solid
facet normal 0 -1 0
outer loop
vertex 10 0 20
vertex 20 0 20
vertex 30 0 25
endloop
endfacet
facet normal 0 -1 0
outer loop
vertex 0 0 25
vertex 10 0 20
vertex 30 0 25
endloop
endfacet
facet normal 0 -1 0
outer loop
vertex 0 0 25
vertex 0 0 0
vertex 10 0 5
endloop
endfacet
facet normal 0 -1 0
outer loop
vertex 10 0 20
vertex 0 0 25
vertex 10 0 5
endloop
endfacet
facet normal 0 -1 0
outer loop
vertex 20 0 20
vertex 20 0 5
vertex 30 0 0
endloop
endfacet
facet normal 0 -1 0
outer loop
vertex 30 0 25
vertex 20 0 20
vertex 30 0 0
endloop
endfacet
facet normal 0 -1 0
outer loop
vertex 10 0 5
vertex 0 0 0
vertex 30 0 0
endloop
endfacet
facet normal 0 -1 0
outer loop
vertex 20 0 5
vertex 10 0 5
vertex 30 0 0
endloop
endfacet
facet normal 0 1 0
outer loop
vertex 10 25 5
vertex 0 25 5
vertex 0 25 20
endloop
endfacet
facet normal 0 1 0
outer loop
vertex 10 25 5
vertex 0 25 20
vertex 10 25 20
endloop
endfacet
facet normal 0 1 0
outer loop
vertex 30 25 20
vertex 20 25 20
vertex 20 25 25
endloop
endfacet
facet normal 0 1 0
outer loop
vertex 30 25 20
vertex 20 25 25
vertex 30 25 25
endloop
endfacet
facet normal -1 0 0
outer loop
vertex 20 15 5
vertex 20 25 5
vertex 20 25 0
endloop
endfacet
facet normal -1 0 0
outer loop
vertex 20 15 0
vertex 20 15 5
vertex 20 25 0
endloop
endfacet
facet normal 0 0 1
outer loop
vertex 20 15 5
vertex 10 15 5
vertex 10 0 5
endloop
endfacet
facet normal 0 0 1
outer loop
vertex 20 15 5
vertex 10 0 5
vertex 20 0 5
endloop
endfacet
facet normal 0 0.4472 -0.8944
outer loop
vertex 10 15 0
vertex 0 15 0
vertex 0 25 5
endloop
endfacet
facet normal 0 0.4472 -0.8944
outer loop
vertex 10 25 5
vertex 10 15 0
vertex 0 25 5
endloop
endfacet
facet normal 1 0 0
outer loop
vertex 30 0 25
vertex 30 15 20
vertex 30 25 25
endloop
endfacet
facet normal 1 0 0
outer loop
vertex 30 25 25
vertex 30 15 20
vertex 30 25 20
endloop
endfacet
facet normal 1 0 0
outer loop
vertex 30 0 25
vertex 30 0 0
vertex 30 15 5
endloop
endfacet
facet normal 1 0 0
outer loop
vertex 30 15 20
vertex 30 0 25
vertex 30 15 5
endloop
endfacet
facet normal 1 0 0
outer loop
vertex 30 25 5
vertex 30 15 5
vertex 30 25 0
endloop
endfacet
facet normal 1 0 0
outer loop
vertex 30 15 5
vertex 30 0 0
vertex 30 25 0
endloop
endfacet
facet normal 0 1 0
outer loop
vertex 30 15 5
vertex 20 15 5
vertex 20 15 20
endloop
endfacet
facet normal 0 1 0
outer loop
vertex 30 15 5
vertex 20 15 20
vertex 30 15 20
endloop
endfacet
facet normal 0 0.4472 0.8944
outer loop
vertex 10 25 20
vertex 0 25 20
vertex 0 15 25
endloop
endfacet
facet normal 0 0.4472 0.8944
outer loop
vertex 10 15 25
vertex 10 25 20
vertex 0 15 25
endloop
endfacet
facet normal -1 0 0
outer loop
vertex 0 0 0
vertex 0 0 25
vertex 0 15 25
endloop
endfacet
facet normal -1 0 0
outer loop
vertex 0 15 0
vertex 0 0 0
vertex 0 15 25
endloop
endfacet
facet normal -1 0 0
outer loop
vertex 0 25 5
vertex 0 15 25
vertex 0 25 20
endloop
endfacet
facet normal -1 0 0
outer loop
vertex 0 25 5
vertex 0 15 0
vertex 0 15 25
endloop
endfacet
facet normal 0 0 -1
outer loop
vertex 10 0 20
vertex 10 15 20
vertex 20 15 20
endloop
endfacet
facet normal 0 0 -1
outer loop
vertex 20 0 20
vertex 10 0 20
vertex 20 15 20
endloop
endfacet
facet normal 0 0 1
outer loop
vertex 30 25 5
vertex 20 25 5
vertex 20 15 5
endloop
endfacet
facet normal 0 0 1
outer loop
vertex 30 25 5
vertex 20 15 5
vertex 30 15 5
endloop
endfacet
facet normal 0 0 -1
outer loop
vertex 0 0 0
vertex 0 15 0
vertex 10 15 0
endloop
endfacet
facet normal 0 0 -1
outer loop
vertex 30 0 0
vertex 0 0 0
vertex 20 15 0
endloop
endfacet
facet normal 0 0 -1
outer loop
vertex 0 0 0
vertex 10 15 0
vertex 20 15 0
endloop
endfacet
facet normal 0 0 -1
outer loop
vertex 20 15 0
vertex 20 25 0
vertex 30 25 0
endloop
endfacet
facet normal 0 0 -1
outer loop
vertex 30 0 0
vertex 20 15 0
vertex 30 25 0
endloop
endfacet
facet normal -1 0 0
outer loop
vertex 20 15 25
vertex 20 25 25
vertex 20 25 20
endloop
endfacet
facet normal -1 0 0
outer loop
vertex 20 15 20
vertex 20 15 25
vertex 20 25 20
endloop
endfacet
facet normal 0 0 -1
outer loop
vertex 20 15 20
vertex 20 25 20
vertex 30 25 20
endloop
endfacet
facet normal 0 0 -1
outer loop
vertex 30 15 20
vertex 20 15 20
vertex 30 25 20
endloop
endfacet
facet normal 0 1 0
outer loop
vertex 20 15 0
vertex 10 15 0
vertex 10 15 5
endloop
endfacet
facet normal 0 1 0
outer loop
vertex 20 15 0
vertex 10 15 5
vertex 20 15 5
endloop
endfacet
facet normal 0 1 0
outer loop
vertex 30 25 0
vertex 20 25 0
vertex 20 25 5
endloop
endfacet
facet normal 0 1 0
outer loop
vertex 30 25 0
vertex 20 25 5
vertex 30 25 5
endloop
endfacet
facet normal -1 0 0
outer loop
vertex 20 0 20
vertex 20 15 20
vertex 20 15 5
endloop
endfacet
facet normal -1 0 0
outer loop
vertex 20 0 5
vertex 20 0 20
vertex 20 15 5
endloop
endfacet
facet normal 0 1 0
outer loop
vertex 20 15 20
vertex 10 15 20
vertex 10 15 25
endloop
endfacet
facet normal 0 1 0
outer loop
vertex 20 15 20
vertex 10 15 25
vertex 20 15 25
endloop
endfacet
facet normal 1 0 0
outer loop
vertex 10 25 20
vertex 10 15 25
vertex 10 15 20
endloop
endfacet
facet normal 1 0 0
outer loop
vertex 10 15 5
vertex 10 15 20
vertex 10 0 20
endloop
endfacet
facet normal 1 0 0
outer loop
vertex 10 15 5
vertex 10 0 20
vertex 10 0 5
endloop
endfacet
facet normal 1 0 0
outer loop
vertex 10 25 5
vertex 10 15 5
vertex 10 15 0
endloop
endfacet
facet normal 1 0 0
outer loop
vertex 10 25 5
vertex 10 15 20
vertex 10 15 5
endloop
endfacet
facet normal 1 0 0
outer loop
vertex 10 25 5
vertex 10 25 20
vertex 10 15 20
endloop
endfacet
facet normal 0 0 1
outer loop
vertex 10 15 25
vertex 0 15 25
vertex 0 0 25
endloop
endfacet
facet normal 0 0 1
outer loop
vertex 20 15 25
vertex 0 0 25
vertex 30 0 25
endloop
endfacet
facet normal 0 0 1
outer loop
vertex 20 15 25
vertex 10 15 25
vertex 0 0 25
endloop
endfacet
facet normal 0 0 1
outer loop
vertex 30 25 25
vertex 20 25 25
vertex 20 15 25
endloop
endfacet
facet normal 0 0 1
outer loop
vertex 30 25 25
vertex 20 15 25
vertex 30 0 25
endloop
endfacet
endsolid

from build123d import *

# Parameters (mm, degrees)
SKETCH1_W           = 30
SKETCH1_H           = 25
BOSS_EXTRUDE1_DEPTH = 25
CUT_EXTRUDE1_DEPTH  = 10
SKETCH3_W           = 10
SKETCH3_H           = 25
CUT_EXTRUDE3_DEPTH  = 10
SKETCH5_W           = 10
SKETCH5_H           = 15
CUT_EXTRUDE4_DEPTH  = 30
SKETCH6_W           = 10
SKETCH6_H           = 15
CUT_EXTRUDE5_DEPTH  = 10


with BuildPart() as part:
    # Sketch1 → Boss-Extrude1 (new body)
    with BuildSketch(Plane.XY):
        with Locations((15, 12.5)):
            Rectangle(SKETCH1_W, SKETCH1_H)
    extrude(amount=BOSS_EXTRUDE1_DEPTH)

    # Sketch2 → Cut-Extrude1 (cut)
    with BuildSketch(Plane.ZY):
        Polygon((0, 15), (5, 25), (0, 25), align=None)
        Polygon((25, 25), (20, 25), (25, 15), align=None)
    extrude(amount=-CUT_EXTRUDE1_DEPTH, mode=Mode.SUBTRACT)

    # Sketch3 → Cut-Extrude3 (cut)
    with BuildSketch(Plane(origin=(0, 25, 0), x_dir=(1, 0, 0), z_dir=(0, 1, 0))):
        with Locations((15, -12.5)):
            Rectangle(SKETCH3_W, SKETCH3_H)
    extrude(amount=-CUT_EXTRUDE3_DEPTH, mode=Mode.SUBTRACT)

    # Sketch5 → Cut-Extrude4 (cut)
    with BuildSketch(Plane(origin=(0, 15, 0), x_dir=(1, 0, 0), z_dir=(0, 1, 0))):
        with Locations((15, -12.5)):
            Rectangle(SKETCH5_W, SKETCH5_H)
    extrude(amount=-CUT_EXTRUDE4_DEPTH, mode=Mode.SUBTRACT)

    # Sketch6 → Cut-Extrude5 (cut)
    with BuildSketch(Plane(origin=(0, 25, 0), x_dir=(1, 0, 0), z_dir=(0, 1, 0))):
        with Locations((25, -12.5)):
            Rectangle(SKETCH6_W, SKETCH6_H)
    extrude(amount=-CUT_EXTRUDE5_DEPTH, mode=Mode.SUBTRACT)


solid = part.part
